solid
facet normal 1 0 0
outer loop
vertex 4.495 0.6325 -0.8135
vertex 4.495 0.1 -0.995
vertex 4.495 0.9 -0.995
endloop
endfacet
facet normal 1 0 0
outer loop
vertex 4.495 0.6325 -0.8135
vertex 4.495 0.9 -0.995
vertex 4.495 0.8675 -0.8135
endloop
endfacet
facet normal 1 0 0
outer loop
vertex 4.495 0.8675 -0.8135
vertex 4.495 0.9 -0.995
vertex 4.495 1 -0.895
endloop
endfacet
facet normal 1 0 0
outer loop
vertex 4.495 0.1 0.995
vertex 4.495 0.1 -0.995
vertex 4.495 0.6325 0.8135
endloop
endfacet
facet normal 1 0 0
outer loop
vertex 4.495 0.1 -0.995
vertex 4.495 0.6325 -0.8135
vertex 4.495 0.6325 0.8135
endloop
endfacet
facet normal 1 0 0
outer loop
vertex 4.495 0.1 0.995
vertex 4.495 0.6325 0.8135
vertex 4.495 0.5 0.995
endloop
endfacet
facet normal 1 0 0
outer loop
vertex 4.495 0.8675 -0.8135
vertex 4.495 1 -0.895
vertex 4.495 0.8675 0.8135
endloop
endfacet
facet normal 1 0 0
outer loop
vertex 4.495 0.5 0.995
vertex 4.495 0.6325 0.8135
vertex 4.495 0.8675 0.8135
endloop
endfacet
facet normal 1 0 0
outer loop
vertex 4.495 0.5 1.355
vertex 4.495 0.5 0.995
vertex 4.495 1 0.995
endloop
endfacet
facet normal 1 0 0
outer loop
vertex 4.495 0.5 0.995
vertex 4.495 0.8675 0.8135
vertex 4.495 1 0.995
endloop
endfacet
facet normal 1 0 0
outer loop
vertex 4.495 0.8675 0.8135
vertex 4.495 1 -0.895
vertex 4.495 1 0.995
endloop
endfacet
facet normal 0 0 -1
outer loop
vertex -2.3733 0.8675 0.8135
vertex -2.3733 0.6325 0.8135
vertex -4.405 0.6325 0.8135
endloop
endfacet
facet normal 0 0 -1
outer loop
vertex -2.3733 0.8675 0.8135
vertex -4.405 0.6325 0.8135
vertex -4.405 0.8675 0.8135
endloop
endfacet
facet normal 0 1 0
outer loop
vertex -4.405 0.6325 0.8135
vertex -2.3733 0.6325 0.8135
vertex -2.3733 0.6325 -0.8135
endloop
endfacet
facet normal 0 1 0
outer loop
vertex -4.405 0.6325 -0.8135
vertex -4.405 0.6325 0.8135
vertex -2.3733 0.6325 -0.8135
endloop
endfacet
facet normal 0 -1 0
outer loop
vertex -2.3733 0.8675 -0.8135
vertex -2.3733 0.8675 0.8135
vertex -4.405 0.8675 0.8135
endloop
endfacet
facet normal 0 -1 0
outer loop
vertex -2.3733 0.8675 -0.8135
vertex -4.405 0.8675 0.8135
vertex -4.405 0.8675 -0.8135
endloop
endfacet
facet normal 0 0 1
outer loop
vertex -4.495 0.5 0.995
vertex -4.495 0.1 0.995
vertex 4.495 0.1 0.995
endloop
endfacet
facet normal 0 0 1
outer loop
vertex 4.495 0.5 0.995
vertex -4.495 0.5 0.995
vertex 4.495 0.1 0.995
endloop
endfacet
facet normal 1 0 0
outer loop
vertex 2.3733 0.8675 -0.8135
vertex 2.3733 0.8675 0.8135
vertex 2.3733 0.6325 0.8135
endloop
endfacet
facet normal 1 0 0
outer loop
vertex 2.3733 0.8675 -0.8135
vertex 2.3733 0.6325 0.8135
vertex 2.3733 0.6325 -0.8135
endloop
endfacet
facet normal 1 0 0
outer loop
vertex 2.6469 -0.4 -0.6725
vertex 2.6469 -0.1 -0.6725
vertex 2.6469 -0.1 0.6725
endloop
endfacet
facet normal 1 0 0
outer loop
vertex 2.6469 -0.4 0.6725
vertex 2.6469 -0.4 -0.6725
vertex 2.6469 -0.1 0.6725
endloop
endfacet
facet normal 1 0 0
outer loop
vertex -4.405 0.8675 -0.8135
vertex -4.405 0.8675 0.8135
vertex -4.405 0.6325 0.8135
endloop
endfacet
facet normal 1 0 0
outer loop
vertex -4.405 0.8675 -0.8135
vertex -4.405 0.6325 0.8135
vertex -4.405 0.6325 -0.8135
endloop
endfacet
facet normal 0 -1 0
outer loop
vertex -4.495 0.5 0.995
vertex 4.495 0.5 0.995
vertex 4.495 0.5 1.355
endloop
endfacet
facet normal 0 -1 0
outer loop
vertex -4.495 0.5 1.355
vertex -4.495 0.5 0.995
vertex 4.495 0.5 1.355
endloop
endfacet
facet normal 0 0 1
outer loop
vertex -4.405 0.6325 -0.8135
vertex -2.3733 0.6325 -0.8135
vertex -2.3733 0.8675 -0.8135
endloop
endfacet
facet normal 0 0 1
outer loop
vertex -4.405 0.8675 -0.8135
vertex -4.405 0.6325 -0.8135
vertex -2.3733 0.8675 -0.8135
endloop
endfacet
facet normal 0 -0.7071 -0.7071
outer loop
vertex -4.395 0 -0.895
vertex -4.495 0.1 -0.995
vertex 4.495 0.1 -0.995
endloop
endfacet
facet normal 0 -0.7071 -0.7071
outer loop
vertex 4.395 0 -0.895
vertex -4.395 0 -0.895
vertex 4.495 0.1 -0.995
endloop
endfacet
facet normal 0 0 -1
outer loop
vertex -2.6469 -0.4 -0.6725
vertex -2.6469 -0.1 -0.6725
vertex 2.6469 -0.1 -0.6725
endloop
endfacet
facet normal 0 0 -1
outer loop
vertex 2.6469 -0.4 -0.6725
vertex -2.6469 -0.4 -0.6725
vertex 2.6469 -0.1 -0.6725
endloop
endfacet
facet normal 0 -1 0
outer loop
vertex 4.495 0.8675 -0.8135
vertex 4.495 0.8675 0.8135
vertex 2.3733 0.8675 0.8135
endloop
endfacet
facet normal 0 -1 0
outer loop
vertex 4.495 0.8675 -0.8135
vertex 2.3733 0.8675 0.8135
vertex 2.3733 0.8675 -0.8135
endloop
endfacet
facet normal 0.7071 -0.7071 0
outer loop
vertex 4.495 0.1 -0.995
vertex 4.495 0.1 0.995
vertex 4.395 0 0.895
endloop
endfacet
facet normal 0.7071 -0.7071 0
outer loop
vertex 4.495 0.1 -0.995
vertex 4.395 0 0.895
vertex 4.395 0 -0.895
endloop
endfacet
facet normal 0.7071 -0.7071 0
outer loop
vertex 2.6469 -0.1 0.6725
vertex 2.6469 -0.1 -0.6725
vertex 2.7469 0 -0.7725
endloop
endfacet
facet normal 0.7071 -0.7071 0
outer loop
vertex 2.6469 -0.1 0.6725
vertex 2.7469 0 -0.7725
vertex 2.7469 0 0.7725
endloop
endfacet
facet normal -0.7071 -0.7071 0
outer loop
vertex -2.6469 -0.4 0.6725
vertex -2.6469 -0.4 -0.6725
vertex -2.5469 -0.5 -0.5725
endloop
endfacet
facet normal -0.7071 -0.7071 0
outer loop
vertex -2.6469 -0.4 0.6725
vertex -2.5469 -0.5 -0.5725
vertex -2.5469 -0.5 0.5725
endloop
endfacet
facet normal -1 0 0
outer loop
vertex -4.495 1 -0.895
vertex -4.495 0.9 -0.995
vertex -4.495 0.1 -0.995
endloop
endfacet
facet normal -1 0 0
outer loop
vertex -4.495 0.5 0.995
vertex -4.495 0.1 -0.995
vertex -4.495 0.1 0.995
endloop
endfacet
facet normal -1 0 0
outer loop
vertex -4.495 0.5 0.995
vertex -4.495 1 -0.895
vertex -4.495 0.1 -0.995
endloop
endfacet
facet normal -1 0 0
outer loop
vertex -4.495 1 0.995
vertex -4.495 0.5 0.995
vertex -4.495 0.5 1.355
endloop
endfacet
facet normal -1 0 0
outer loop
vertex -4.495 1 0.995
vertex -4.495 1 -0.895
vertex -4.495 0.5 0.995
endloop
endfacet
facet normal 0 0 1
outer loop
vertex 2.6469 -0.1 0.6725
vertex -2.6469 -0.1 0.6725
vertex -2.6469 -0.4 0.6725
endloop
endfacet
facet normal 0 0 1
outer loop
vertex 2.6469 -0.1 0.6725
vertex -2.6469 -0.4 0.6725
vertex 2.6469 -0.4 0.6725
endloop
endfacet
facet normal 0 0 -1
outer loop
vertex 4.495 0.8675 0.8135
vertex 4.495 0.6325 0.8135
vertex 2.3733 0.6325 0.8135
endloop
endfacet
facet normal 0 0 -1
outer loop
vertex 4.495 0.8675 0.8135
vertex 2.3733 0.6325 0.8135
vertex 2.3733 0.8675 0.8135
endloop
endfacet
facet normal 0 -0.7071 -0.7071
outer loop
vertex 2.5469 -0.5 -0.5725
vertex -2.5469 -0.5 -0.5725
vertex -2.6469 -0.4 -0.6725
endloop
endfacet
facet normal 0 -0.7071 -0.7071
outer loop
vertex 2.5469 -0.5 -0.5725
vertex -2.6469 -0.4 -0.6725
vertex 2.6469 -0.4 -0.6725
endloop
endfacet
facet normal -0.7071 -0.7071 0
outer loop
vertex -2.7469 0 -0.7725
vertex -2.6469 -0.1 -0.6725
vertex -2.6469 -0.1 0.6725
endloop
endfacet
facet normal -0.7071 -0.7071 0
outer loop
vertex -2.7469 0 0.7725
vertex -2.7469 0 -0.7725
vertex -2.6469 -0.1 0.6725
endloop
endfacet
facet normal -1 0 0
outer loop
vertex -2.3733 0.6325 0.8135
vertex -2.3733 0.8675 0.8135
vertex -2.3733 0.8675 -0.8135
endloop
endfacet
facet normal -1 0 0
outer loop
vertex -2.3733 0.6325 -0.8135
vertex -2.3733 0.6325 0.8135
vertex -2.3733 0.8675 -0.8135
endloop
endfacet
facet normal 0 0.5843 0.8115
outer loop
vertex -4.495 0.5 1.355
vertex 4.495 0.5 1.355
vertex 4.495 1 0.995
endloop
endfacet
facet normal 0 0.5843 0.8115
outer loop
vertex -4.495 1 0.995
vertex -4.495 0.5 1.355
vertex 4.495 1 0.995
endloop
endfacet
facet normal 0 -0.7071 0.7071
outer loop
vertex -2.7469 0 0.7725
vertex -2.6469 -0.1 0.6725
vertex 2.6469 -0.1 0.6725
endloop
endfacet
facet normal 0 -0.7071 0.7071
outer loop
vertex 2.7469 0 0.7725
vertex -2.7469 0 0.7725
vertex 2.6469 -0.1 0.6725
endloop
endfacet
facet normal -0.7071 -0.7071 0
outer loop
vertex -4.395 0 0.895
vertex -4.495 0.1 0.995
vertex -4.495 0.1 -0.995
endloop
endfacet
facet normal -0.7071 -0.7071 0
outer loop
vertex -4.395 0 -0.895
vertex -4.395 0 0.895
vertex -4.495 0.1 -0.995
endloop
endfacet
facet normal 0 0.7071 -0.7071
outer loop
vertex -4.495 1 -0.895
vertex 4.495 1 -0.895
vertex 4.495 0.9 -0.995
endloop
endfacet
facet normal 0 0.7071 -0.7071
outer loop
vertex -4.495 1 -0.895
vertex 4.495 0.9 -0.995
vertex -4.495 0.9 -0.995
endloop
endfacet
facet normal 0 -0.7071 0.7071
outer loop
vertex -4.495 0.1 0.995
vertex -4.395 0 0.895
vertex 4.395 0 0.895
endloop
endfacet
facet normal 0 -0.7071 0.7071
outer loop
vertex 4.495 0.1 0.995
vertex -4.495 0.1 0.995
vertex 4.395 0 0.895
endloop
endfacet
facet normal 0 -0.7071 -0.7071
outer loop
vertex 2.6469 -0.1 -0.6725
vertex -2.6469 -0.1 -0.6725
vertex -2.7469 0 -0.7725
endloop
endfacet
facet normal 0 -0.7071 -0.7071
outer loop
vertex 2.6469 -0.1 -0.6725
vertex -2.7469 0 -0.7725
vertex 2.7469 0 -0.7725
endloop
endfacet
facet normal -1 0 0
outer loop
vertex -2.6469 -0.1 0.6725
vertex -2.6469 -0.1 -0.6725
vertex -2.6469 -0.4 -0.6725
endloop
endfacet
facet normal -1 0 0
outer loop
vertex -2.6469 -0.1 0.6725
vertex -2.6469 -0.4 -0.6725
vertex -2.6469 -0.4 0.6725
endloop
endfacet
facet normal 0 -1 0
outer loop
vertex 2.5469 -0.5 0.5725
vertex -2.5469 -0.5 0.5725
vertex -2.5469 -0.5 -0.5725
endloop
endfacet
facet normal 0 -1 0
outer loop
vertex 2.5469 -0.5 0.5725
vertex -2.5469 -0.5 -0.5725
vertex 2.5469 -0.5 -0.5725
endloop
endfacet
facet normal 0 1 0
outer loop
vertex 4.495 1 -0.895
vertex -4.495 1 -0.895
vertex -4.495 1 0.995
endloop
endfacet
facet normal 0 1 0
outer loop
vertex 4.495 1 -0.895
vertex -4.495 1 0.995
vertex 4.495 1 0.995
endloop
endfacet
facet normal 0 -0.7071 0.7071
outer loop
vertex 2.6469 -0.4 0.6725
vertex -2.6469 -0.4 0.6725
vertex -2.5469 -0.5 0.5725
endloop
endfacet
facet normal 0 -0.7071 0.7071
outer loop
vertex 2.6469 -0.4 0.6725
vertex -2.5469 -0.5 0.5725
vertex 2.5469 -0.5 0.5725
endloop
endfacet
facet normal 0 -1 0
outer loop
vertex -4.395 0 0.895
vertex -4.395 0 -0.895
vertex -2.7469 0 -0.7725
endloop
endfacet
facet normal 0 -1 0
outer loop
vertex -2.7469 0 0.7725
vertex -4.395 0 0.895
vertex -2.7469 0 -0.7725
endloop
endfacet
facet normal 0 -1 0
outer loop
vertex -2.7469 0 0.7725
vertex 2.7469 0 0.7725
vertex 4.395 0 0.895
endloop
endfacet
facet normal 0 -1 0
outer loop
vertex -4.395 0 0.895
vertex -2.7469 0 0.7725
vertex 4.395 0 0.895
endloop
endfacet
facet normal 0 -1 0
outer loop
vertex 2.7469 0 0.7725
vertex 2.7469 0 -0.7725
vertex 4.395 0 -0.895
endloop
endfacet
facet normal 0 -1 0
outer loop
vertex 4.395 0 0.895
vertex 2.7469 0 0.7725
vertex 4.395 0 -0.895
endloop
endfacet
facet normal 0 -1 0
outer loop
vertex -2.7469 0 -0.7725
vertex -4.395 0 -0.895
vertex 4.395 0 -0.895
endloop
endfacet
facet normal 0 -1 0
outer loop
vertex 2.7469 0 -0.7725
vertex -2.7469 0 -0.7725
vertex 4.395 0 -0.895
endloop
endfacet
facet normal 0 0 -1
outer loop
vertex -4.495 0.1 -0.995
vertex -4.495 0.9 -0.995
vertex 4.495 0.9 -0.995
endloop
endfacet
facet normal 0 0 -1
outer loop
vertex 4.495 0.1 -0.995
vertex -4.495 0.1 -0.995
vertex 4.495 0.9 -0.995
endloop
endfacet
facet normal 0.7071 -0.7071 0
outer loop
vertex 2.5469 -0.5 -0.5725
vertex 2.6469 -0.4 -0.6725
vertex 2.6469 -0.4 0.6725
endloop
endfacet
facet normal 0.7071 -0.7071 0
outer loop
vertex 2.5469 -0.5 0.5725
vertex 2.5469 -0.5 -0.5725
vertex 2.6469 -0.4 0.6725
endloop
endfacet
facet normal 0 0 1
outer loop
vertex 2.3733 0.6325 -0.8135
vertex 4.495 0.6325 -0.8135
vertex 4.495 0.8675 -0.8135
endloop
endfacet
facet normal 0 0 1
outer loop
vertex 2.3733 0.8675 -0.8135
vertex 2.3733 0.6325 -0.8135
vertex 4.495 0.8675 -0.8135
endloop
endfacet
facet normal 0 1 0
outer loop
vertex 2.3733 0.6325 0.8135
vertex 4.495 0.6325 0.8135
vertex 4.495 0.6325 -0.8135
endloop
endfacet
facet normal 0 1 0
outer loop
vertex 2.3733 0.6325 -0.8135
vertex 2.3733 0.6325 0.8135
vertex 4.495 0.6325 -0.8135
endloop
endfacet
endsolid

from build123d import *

# Parameters (mm, degrees)
SKETCH_1_W          = 8.99
SKETCH_1_H          = 1.99
EXTRUDE_1_DEPTH     = 1
EXTRUDE_2_DEPTH     = 8.99
SKETCH_3_W          = 1.62690844
SKETCH_3_H          = 0.234992706
CUT_EXTRUDE_2_DEPTH = 8.9
SKETCH_4_W          = 5.293711796
SKETCH_4_H          = 1.344910324
EXTRUDE_3_DEPTH     = 0.5
SKETCH_5_W          = 4.74668983
SKETCH_5_H          = 1.99
EXTRUDE_4_DEPTH     = 0.5
CHAMFER_1_SIZE      = 0.1
CHAMFER_2_SIZE      = 0.1


with BuildPart() as part:
    # 草图1 → 凸台-拉伸1 (new body)
    with BuildSketch(Plane(origin=(0, 0, 0), x_dir=(1, 0, 0), z_dir=(0, 1, 0))):
        Rectangle(SKETCH_1_W, SKETCH_1_H)
    extrude(amount=EXTRUDE_1_DEPTH)

    # 草图2 → 凸台-拉伸2 (add)
    with BuildSketch(Plane(origin=(4.495, 0, 0), x_dir=(0, 0, -1), z_dir=(1, 0, 0))):
        Polygon((-0.995, 0.5), (-1.355023595, 0.5), (-0.995, 1), align=None)
    extrude(amount=-EXTRUDE_2_DEPTH)

    # 草图3 → 切除-拉伸2 (cut)
    with BuildSketch(Plane(origin=(4.495, 0, 0), x_dir=(0, 0, -1), z_dir=(1, 0, 0))):
        with Locations((0, 0.75)):
            Rectangle(SKETCH_3_W, SKETCH_3_H)
    extrude(amount=-CUT_EXTRUDE_2_DEPTH, mode=Mode.SUBTRACT)

    # 草图4 → 凸台-拉伸3 (add)
    with BuildSketch(Plane.XZ):
        Rectangle(SKETCH_4_W, SKETCH_4_H)
    extrude(amount=EXTRUDE_3_DEPTH)

    # 草图5 → 凸台-拉伸4 (add)
    with BuildSketch(Plane(origin=(0, 1, 0), x_dir=(1, 0, 0), z_dir=(0, 1, 0))):
        Rectangle(SKETCH_5_W, SKETCH_5_H)
    extrude(amount=-EXTRUDE_4_DEPTH)

    # 倒角1
    chamfer_1_edges = [part.edges().sort_by_distance(p)[0] for p in [
        (2.646855898, 0, 0),
        (0, 0, 0.672455162),
        (-2.646855898, 0, 0),
        (0, 0, -0.672455162),
        (2.646855898, -0.5, 0),
        (0, -0.5, 0.672455162),
        (-2.646855898, -0.5, 0),
        (0, -0.5, -0.672455162),
        (0, 0, 0.995),
        (-4.495, 0, 0),
        (0, 0, -0.995),
        (4.495, 0, 0),
    ]]
    chamfer(chamfer_1_edges, length=CHAMFER_1_SIZE)

    # 倒角2
    chamfer_2_edges = [part.edges().sort_by_distance(p)[0] for p in [
        (0, 1, -0.995),
    ]]
    chamfer(chamfer_2_edges, length=CHAMFER_2_SIZE)


solid = part.part
